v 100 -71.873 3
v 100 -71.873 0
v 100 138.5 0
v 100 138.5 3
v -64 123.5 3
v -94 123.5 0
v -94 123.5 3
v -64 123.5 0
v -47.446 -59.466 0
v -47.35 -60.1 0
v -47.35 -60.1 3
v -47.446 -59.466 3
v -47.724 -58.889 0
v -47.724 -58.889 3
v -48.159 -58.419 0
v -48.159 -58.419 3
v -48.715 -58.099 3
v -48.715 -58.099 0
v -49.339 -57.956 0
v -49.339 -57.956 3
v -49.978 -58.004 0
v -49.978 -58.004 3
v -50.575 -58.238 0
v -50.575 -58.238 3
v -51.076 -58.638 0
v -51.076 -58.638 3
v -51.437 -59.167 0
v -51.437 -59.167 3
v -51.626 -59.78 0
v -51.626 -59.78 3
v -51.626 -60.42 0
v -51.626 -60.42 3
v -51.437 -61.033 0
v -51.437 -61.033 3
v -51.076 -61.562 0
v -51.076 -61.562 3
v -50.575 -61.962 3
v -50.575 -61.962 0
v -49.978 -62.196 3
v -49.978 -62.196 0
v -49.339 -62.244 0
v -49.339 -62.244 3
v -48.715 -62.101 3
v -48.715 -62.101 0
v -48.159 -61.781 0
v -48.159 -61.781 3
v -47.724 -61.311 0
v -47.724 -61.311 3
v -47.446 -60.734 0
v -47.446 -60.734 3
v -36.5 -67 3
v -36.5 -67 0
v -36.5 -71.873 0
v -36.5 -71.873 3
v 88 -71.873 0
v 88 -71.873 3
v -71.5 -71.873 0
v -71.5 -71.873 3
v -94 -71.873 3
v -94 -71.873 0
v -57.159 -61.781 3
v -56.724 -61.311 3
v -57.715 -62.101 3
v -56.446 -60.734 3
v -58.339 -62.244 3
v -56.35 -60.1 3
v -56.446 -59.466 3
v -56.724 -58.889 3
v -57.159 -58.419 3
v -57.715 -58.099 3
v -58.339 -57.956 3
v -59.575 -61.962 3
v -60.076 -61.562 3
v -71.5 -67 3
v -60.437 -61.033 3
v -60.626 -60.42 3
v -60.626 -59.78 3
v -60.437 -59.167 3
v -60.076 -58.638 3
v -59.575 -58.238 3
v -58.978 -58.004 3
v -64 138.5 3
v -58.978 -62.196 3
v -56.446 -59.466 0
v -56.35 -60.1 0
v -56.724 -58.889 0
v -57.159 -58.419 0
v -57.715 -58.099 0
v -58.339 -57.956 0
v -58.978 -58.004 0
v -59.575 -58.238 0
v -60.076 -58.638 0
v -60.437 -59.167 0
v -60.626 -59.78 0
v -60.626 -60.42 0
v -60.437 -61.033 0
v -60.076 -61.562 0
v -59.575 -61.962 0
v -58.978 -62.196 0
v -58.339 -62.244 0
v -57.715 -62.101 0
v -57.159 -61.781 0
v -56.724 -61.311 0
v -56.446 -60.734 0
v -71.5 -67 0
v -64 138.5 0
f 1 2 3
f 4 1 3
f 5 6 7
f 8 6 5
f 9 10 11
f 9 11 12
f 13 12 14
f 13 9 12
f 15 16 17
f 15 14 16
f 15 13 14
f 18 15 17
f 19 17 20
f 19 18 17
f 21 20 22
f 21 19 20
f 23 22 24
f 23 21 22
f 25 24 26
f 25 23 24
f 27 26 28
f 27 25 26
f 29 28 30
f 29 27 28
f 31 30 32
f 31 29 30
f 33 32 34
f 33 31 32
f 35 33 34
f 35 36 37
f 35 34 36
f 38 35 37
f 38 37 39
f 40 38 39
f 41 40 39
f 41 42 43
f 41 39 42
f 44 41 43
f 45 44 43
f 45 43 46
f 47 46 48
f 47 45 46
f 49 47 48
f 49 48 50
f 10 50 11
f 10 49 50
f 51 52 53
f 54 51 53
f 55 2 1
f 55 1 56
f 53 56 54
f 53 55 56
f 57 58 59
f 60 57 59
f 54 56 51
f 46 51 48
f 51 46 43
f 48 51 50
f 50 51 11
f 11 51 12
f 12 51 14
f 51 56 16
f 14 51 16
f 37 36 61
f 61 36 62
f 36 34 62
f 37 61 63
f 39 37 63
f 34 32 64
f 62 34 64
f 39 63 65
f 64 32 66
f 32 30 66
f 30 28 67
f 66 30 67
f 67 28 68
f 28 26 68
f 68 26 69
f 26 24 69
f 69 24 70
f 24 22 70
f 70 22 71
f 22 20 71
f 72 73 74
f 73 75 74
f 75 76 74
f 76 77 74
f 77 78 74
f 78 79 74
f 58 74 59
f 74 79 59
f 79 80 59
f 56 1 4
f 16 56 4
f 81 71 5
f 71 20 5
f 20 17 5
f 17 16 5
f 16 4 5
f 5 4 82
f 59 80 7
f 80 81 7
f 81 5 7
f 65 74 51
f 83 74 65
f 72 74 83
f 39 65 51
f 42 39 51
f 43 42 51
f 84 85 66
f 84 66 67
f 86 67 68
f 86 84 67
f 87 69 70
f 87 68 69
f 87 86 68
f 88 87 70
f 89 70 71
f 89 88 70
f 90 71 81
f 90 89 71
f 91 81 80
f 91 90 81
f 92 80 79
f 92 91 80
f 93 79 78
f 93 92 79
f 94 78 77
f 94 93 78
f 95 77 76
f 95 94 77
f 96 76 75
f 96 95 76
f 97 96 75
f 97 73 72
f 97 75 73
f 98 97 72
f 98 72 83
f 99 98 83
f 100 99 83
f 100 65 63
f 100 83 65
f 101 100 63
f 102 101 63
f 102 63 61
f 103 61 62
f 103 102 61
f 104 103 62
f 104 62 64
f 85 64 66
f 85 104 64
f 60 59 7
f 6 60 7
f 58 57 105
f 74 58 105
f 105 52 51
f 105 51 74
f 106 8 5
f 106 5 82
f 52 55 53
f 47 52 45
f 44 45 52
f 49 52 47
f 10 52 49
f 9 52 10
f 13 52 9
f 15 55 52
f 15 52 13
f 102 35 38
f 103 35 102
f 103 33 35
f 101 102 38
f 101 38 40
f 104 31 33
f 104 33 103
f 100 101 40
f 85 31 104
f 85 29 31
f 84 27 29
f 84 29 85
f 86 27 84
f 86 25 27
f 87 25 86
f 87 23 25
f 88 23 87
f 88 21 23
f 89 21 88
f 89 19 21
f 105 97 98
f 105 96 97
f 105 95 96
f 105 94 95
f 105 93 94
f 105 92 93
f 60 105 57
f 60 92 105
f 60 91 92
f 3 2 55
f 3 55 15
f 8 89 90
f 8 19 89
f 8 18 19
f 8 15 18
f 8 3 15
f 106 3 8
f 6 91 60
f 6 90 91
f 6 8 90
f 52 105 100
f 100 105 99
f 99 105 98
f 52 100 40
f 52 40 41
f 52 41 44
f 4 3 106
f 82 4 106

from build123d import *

# Parameters (mm, degrees)
SKETCH_1_W               = 180
SKETCH_1_H               = 195
EXTRUDE_1_DEPTH          = 3
CUT_EXTRUDE_1_DEPTH      = 133.722454769
CUT_EXTRUDE_1_DEPTH_BACK = 133.722454769
SKETCH_2_R               = 2.15
SKETCH_3_W               = 10
SKETCH_3_H               = 195
EXTRUDE_2_DEPTH          = 3
SKETCH_4_W               = 116
SKETCH_4_H               = 22
EXTRUDE_3_DEPTH          = 3
CUT_EXTRUDE_2_DEPTH      = 156.850088226
CUT_EXTRUDE_2_DEPTH_BACK = 156.850088226
SKETCH_5_W               = 116
SKETCH_5_H               = 7
CUT_EXTRUDE_3_DEPTH      = 151.549825639
CUT_EXTRUDE_3_DEPTH_BACK = 151.549825639
CUT_EXTRUDE_4_DEPTH      = 150.06122903
CUT_EXTRUDE_4_DEPTH_BACK = 150.06122903
SKETCH_7_W               = 188
SKETCH_7_H               = 38.626728851
EXTRUDE_4_DEPTH          = 3
CUT_EXTRUDE_5_DEPTH      = 159.937880947
CUT_EXTRUDE_5_DEPTH_BACK = 159.937880947
SKETCH_9_W               = 6
SKETCH_9_H               = 195.373271149
SKETCH_11_W              = 164
SKETCH_11_H              = 15
EXTRUDE_5_DEPTH          = 3


with BuildPart() as part:
    # 草图1 → 凸台-拉伸1 (new body)
    with BuildSketch(Plane.XY):
        Rectangle(SKETCH_1_W, SKETCH_1_H)
    extrude(amount=EXTRUDE_1_DEPTH)

    # 草图2 → 切除-拉伸1 (cut, two sides: drawn at the far end of the back side and taken through both)
    with BuildSketch(Plane.XY.offset(3).offset(-CUT_EXTRUDE_1_DEPTH_BACK)):
        with Locations((-58.5, -60.1)):
            Circle(SKETCH_2_R)
        with Locations((-49.5, -60.1)):
            Circle(SKETCH_2_R)
        Polygon((-71.5, -67), (-67.7, -67), (-40.3, -67), (-36.5, -67), (-36.5, -72.5), (-26, -72.5), (-26, -97.5), (-82, -97.5), (-82, -72.5), (-71.5, -72.5), align=None)
    extrude(amount=CUT_EXTRUDE_1_DEPTH + CUT_EXTRUDE_1_DEPTH_BACK, mode=Mode.SUBTRACT)

    # 草图3 → 凸台-拉伸2 (add)
    with BuildSketch(Plane.XY.offset(3)):
        with Locations((-95, 0)):
            Rectangle(SKETCH_3_W, SKETCH_3_H)
    extrude(amount=-EXTRUDE_2_DEPTH)

    # 草图4 → 凸台-拉伸3 (add)
    with BuildSketch(Plane(origin=(0, 0, 0), x_dir=(-1, 0, 0), z_dir=(0, 0, -1))):
        with Locations((-32, -108.5)):
            Rectangle(SKETCH_4_W, SKETCH_4_H)
    extrude(amount=-EXTRUDE_3_DEPTH)

    # 草图5 → 切除-拉伸2 (cut, two sides: drawn at the far end of the back side and taken through both)
    with BuildSketch(Plane(origin=(0, 0, 0), x_dir=(-1, 0, 0), z_dir=(0, 0, -1)).offset(-CUT_EXTRUDE_2_DEPTH_BACK)):
        with Locations((-32, -116)):
            Rectangle(SKETCH_5_W, SKETCH_5_H)
    extrude(amount=CUT_EXTRUDE_2_DEPTH + CUT_EXTRUDE_2_DEPTH_BACK, mode=Mode.SUBTRACT)

    # 草图6 → 切除-拉伸3 (cut, two sides: drawn at the far end of the back side and taken through both)
    with BuildSketch(Plane(origin=(0, 0, 0), x_dir=(-1, 0, 0), z_dir=(0, 0, -1)).offset(-CUT_EXTRUDE_3_DEPTH_BACK)):
        Polygon((100, -97.5), (100, -95.5), (84, -95.5), (84, -72.5), (82, -72.5), (82, -97.5), align=None)
        Polygon((24, -72.5), (24, -110.5), (-88, -110.5), (-88, 95.5), (100, 95.5), (100, 97.5), (-90, 97.5), (-90, -112.5), (26, -112.5), (26, -72.5), align=None)
    extrude(amount=CUT_EXTRUDE_3_DEPTH + CUT_EXTRUDE_3_DEPTH_BACK, mode=Mode.SUBTRACT)

    # 草图7 → 切除-拉伸4 (cut, two sides: drawn at the far end of the back side and taken through both)
    with BuildSketch(Plane(origin=(0, 0, 0), x_dir=(-1, 0, 0), z_dir=(0, 0, -1)).offset(-CUT_EXTRUDE_4_DEPTH_BACK)):
        with Locations((6, -91.186635575)):
            Rectangle(SKETCH_7_W, SKETCH_7_H)
    extrude(amount=CUT_EXTRUDE_4_DEPTH + CUT_EXTRUDE_4_DEPTH_BACK, mode=Mode.SUBTRACT)

    # 草图8 → 凸台-拉伸4 (add)
    with BuildSketch(Plane(origin=(0, 0, 0), x_dir=(-1, 0, 0), z_dir=(0, 0, -1))):
        Polygon((-88, 95.5), (100, 95.5), (100, 123.5), (-80, 123.5), (-100, 123.5), (-100, -71.873271149), (-88, -71.873271149), align=None)
    extrude(amount=-EXTRUDE_4_DEPTH)

    # 草图9 → 切除-拉伸5 (cut, two sides: drawn at the far end of the back side and taken through both)
    with BuildSketch(Plane(origin=(0, 0, 0), x_dir=(-1, 0, 0), z_dir=(0, 0, -1)).offset(-CUT_EXTRUDE_5_DEPTH_BACK)):
        with Locations((97, 25.813364426)):
            Rectangle(SKETCH_9_W, SKETCH_9_H)
    extrude(amount=CUT_EXTRUDE_5_DEPTH + CUT_EXTRUDE_5_DEPTH_BACK, mode=Mode.SUBTRACT)

    # 草图11 → 凸台-拉伸5 (add)
    with BuildSketch(Plane(origin=(0, 0, 0), x_dir=(-1, 0, 0), z_dir=(0, 0, -1))):
        with Locations((-18, 131)):
            Rectangle(SKETCH_11_W, SKETCH_11_H)
    extrude(amount=-EXTRUDE_5_DEPTH)


solid = part.part
